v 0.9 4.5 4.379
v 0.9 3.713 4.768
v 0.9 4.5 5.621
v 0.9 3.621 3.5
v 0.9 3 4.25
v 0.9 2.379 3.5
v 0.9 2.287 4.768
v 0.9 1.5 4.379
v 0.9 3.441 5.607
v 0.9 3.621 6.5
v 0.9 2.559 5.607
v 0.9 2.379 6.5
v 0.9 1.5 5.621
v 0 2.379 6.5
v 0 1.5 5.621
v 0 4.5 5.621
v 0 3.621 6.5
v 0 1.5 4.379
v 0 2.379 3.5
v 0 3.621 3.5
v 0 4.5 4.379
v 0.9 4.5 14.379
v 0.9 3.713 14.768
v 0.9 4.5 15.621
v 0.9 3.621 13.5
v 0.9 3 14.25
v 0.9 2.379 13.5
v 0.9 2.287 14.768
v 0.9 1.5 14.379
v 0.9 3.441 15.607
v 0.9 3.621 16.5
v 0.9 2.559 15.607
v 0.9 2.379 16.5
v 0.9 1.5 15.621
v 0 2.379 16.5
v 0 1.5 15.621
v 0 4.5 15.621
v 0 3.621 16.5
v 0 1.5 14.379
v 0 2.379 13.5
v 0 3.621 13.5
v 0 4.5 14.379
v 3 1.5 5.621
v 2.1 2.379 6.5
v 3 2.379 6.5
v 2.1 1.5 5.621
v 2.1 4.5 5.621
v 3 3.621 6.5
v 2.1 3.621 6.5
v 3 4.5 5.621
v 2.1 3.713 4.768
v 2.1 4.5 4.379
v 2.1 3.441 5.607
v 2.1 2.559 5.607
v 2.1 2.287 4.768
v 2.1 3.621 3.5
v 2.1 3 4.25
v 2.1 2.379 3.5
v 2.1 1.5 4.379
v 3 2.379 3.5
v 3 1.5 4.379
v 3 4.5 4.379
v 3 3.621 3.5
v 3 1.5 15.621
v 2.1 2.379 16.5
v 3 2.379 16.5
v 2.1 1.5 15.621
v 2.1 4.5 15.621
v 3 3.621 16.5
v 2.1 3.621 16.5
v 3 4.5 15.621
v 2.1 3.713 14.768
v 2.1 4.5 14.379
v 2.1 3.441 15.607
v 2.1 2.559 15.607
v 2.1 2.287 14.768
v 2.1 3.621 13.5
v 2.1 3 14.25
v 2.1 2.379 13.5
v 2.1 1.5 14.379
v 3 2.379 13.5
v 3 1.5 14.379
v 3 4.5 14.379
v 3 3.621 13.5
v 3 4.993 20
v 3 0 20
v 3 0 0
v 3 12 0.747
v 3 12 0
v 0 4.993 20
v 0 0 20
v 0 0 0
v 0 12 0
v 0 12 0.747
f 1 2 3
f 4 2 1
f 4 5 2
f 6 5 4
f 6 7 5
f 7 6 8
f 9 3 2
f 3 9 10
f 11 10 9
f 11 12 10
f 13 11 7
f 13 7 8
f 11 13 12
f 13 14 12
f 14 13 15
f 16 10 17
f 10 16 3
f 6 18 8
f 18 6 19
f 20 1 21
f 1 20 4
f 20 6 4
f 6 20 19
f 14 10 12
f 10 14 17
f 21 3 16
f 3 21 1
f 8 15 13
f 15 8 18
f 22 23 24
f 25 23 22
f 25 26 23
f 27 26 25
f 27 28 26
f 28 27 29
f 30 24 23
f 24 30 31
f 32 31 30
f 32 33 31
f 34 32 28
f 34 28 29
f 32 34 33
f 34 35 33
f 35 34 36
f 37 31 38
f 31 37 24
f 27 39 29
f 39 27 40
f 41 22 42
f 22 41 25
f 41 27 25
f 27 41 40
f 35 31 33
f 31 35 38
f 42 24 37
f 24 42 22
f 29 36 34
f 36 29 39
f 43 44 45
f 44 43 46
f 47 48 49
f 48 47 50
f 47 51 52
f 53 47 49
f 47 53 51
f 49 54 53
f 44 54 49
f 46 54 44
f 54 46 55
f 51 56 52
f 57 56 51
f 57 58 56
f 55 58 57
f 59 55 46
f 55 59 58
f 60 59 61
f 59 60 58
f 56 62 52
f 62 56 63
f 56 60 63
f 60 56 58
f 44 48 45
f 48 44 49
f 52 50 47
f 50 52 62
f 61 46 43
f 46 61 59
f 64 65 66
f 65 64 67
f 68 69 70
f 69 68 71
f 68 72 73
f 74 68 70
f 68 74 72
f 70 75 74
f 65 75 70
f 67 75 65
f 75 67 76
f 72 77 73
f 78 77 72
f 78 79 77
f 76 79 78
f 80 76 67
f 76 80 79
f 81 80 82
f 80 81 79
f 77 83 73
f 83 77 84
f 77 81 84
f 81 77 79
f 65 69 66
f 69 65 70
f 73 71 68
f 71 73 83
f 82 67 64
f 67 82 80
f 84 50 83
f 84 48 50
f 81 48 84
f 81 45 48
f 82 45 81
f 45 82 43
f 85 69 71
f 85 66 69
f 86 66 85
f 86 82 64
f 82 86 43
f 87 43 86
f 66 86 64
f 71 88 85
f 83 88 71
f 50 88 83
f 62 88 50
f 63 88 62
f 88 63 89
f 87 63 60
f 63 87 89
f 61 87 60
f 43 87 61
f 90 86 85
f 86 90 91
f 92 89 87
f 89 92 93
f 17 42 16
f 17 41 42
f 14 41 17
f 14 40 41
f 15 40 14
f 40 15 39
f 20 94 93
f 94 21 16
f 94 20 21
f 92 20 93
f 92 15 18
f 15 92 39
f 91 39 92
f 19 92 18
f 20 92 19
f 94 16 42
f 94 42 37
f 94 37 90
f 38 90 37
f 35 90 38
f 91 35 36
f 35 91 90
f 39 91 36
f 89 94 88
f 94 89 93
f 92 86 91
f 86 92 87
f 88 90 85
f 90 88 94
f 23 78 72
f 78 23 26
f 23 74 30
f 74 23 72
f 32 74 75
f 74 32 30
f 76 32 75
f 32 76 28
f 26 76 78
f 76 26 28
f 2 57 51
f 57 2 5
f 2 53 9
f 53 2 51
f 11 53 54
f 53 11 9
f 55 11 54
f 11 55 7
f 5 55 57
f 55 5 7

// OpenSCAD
// file: sunk_screw.scad
// http://cl.ly/image/0f0M1U1D0n3T

module sunk_screw(size) {
  difference() {
    rotate([0,0,45]) cube([size,size,1], center=true);
    translate([size,0,0]) cube([size,size,2], center=true);
    translate([-size,0,0]) cube([size,size,2], center=true);
    translate([0,size,0]) cube([size,size,2], center=true);
    translate([0,-size,0]) cube([size,size,2], center=true);
  }
}

sunk_screw(10);
// main file
// http://cl.ly/image/1a213J1w3m39

use <sunk_screw.scad>;

module servo_mount() {
  dimensions = [3,12,20];

  difference() {
    cube(dimensions);
    translate([-1,13,-2]) rotate([20,0,0]) cube([5,20,30]);
    translate([1.5,3,15]) rotate([0,90,0]) cylinder(h=5,r=0.75, center=true);
    translate([1.5,3,5]) rotate([0,90,0]) cylinder(h=5,r=0.75, center=true);
    translate([0.4,3,5]) rotate([0,90,0]) sunk_screw(3);
    translate([0.4,3,15]) rotate([0,90,0]) sunk_screw(3);
    translate([2.6,3,5]) rotate([0,90,0]) sunk_screw(3);
    translate([2.6,3,15]) rotate([0,90,0]) sunk_screw(3);
  }
}

servo_mount();
